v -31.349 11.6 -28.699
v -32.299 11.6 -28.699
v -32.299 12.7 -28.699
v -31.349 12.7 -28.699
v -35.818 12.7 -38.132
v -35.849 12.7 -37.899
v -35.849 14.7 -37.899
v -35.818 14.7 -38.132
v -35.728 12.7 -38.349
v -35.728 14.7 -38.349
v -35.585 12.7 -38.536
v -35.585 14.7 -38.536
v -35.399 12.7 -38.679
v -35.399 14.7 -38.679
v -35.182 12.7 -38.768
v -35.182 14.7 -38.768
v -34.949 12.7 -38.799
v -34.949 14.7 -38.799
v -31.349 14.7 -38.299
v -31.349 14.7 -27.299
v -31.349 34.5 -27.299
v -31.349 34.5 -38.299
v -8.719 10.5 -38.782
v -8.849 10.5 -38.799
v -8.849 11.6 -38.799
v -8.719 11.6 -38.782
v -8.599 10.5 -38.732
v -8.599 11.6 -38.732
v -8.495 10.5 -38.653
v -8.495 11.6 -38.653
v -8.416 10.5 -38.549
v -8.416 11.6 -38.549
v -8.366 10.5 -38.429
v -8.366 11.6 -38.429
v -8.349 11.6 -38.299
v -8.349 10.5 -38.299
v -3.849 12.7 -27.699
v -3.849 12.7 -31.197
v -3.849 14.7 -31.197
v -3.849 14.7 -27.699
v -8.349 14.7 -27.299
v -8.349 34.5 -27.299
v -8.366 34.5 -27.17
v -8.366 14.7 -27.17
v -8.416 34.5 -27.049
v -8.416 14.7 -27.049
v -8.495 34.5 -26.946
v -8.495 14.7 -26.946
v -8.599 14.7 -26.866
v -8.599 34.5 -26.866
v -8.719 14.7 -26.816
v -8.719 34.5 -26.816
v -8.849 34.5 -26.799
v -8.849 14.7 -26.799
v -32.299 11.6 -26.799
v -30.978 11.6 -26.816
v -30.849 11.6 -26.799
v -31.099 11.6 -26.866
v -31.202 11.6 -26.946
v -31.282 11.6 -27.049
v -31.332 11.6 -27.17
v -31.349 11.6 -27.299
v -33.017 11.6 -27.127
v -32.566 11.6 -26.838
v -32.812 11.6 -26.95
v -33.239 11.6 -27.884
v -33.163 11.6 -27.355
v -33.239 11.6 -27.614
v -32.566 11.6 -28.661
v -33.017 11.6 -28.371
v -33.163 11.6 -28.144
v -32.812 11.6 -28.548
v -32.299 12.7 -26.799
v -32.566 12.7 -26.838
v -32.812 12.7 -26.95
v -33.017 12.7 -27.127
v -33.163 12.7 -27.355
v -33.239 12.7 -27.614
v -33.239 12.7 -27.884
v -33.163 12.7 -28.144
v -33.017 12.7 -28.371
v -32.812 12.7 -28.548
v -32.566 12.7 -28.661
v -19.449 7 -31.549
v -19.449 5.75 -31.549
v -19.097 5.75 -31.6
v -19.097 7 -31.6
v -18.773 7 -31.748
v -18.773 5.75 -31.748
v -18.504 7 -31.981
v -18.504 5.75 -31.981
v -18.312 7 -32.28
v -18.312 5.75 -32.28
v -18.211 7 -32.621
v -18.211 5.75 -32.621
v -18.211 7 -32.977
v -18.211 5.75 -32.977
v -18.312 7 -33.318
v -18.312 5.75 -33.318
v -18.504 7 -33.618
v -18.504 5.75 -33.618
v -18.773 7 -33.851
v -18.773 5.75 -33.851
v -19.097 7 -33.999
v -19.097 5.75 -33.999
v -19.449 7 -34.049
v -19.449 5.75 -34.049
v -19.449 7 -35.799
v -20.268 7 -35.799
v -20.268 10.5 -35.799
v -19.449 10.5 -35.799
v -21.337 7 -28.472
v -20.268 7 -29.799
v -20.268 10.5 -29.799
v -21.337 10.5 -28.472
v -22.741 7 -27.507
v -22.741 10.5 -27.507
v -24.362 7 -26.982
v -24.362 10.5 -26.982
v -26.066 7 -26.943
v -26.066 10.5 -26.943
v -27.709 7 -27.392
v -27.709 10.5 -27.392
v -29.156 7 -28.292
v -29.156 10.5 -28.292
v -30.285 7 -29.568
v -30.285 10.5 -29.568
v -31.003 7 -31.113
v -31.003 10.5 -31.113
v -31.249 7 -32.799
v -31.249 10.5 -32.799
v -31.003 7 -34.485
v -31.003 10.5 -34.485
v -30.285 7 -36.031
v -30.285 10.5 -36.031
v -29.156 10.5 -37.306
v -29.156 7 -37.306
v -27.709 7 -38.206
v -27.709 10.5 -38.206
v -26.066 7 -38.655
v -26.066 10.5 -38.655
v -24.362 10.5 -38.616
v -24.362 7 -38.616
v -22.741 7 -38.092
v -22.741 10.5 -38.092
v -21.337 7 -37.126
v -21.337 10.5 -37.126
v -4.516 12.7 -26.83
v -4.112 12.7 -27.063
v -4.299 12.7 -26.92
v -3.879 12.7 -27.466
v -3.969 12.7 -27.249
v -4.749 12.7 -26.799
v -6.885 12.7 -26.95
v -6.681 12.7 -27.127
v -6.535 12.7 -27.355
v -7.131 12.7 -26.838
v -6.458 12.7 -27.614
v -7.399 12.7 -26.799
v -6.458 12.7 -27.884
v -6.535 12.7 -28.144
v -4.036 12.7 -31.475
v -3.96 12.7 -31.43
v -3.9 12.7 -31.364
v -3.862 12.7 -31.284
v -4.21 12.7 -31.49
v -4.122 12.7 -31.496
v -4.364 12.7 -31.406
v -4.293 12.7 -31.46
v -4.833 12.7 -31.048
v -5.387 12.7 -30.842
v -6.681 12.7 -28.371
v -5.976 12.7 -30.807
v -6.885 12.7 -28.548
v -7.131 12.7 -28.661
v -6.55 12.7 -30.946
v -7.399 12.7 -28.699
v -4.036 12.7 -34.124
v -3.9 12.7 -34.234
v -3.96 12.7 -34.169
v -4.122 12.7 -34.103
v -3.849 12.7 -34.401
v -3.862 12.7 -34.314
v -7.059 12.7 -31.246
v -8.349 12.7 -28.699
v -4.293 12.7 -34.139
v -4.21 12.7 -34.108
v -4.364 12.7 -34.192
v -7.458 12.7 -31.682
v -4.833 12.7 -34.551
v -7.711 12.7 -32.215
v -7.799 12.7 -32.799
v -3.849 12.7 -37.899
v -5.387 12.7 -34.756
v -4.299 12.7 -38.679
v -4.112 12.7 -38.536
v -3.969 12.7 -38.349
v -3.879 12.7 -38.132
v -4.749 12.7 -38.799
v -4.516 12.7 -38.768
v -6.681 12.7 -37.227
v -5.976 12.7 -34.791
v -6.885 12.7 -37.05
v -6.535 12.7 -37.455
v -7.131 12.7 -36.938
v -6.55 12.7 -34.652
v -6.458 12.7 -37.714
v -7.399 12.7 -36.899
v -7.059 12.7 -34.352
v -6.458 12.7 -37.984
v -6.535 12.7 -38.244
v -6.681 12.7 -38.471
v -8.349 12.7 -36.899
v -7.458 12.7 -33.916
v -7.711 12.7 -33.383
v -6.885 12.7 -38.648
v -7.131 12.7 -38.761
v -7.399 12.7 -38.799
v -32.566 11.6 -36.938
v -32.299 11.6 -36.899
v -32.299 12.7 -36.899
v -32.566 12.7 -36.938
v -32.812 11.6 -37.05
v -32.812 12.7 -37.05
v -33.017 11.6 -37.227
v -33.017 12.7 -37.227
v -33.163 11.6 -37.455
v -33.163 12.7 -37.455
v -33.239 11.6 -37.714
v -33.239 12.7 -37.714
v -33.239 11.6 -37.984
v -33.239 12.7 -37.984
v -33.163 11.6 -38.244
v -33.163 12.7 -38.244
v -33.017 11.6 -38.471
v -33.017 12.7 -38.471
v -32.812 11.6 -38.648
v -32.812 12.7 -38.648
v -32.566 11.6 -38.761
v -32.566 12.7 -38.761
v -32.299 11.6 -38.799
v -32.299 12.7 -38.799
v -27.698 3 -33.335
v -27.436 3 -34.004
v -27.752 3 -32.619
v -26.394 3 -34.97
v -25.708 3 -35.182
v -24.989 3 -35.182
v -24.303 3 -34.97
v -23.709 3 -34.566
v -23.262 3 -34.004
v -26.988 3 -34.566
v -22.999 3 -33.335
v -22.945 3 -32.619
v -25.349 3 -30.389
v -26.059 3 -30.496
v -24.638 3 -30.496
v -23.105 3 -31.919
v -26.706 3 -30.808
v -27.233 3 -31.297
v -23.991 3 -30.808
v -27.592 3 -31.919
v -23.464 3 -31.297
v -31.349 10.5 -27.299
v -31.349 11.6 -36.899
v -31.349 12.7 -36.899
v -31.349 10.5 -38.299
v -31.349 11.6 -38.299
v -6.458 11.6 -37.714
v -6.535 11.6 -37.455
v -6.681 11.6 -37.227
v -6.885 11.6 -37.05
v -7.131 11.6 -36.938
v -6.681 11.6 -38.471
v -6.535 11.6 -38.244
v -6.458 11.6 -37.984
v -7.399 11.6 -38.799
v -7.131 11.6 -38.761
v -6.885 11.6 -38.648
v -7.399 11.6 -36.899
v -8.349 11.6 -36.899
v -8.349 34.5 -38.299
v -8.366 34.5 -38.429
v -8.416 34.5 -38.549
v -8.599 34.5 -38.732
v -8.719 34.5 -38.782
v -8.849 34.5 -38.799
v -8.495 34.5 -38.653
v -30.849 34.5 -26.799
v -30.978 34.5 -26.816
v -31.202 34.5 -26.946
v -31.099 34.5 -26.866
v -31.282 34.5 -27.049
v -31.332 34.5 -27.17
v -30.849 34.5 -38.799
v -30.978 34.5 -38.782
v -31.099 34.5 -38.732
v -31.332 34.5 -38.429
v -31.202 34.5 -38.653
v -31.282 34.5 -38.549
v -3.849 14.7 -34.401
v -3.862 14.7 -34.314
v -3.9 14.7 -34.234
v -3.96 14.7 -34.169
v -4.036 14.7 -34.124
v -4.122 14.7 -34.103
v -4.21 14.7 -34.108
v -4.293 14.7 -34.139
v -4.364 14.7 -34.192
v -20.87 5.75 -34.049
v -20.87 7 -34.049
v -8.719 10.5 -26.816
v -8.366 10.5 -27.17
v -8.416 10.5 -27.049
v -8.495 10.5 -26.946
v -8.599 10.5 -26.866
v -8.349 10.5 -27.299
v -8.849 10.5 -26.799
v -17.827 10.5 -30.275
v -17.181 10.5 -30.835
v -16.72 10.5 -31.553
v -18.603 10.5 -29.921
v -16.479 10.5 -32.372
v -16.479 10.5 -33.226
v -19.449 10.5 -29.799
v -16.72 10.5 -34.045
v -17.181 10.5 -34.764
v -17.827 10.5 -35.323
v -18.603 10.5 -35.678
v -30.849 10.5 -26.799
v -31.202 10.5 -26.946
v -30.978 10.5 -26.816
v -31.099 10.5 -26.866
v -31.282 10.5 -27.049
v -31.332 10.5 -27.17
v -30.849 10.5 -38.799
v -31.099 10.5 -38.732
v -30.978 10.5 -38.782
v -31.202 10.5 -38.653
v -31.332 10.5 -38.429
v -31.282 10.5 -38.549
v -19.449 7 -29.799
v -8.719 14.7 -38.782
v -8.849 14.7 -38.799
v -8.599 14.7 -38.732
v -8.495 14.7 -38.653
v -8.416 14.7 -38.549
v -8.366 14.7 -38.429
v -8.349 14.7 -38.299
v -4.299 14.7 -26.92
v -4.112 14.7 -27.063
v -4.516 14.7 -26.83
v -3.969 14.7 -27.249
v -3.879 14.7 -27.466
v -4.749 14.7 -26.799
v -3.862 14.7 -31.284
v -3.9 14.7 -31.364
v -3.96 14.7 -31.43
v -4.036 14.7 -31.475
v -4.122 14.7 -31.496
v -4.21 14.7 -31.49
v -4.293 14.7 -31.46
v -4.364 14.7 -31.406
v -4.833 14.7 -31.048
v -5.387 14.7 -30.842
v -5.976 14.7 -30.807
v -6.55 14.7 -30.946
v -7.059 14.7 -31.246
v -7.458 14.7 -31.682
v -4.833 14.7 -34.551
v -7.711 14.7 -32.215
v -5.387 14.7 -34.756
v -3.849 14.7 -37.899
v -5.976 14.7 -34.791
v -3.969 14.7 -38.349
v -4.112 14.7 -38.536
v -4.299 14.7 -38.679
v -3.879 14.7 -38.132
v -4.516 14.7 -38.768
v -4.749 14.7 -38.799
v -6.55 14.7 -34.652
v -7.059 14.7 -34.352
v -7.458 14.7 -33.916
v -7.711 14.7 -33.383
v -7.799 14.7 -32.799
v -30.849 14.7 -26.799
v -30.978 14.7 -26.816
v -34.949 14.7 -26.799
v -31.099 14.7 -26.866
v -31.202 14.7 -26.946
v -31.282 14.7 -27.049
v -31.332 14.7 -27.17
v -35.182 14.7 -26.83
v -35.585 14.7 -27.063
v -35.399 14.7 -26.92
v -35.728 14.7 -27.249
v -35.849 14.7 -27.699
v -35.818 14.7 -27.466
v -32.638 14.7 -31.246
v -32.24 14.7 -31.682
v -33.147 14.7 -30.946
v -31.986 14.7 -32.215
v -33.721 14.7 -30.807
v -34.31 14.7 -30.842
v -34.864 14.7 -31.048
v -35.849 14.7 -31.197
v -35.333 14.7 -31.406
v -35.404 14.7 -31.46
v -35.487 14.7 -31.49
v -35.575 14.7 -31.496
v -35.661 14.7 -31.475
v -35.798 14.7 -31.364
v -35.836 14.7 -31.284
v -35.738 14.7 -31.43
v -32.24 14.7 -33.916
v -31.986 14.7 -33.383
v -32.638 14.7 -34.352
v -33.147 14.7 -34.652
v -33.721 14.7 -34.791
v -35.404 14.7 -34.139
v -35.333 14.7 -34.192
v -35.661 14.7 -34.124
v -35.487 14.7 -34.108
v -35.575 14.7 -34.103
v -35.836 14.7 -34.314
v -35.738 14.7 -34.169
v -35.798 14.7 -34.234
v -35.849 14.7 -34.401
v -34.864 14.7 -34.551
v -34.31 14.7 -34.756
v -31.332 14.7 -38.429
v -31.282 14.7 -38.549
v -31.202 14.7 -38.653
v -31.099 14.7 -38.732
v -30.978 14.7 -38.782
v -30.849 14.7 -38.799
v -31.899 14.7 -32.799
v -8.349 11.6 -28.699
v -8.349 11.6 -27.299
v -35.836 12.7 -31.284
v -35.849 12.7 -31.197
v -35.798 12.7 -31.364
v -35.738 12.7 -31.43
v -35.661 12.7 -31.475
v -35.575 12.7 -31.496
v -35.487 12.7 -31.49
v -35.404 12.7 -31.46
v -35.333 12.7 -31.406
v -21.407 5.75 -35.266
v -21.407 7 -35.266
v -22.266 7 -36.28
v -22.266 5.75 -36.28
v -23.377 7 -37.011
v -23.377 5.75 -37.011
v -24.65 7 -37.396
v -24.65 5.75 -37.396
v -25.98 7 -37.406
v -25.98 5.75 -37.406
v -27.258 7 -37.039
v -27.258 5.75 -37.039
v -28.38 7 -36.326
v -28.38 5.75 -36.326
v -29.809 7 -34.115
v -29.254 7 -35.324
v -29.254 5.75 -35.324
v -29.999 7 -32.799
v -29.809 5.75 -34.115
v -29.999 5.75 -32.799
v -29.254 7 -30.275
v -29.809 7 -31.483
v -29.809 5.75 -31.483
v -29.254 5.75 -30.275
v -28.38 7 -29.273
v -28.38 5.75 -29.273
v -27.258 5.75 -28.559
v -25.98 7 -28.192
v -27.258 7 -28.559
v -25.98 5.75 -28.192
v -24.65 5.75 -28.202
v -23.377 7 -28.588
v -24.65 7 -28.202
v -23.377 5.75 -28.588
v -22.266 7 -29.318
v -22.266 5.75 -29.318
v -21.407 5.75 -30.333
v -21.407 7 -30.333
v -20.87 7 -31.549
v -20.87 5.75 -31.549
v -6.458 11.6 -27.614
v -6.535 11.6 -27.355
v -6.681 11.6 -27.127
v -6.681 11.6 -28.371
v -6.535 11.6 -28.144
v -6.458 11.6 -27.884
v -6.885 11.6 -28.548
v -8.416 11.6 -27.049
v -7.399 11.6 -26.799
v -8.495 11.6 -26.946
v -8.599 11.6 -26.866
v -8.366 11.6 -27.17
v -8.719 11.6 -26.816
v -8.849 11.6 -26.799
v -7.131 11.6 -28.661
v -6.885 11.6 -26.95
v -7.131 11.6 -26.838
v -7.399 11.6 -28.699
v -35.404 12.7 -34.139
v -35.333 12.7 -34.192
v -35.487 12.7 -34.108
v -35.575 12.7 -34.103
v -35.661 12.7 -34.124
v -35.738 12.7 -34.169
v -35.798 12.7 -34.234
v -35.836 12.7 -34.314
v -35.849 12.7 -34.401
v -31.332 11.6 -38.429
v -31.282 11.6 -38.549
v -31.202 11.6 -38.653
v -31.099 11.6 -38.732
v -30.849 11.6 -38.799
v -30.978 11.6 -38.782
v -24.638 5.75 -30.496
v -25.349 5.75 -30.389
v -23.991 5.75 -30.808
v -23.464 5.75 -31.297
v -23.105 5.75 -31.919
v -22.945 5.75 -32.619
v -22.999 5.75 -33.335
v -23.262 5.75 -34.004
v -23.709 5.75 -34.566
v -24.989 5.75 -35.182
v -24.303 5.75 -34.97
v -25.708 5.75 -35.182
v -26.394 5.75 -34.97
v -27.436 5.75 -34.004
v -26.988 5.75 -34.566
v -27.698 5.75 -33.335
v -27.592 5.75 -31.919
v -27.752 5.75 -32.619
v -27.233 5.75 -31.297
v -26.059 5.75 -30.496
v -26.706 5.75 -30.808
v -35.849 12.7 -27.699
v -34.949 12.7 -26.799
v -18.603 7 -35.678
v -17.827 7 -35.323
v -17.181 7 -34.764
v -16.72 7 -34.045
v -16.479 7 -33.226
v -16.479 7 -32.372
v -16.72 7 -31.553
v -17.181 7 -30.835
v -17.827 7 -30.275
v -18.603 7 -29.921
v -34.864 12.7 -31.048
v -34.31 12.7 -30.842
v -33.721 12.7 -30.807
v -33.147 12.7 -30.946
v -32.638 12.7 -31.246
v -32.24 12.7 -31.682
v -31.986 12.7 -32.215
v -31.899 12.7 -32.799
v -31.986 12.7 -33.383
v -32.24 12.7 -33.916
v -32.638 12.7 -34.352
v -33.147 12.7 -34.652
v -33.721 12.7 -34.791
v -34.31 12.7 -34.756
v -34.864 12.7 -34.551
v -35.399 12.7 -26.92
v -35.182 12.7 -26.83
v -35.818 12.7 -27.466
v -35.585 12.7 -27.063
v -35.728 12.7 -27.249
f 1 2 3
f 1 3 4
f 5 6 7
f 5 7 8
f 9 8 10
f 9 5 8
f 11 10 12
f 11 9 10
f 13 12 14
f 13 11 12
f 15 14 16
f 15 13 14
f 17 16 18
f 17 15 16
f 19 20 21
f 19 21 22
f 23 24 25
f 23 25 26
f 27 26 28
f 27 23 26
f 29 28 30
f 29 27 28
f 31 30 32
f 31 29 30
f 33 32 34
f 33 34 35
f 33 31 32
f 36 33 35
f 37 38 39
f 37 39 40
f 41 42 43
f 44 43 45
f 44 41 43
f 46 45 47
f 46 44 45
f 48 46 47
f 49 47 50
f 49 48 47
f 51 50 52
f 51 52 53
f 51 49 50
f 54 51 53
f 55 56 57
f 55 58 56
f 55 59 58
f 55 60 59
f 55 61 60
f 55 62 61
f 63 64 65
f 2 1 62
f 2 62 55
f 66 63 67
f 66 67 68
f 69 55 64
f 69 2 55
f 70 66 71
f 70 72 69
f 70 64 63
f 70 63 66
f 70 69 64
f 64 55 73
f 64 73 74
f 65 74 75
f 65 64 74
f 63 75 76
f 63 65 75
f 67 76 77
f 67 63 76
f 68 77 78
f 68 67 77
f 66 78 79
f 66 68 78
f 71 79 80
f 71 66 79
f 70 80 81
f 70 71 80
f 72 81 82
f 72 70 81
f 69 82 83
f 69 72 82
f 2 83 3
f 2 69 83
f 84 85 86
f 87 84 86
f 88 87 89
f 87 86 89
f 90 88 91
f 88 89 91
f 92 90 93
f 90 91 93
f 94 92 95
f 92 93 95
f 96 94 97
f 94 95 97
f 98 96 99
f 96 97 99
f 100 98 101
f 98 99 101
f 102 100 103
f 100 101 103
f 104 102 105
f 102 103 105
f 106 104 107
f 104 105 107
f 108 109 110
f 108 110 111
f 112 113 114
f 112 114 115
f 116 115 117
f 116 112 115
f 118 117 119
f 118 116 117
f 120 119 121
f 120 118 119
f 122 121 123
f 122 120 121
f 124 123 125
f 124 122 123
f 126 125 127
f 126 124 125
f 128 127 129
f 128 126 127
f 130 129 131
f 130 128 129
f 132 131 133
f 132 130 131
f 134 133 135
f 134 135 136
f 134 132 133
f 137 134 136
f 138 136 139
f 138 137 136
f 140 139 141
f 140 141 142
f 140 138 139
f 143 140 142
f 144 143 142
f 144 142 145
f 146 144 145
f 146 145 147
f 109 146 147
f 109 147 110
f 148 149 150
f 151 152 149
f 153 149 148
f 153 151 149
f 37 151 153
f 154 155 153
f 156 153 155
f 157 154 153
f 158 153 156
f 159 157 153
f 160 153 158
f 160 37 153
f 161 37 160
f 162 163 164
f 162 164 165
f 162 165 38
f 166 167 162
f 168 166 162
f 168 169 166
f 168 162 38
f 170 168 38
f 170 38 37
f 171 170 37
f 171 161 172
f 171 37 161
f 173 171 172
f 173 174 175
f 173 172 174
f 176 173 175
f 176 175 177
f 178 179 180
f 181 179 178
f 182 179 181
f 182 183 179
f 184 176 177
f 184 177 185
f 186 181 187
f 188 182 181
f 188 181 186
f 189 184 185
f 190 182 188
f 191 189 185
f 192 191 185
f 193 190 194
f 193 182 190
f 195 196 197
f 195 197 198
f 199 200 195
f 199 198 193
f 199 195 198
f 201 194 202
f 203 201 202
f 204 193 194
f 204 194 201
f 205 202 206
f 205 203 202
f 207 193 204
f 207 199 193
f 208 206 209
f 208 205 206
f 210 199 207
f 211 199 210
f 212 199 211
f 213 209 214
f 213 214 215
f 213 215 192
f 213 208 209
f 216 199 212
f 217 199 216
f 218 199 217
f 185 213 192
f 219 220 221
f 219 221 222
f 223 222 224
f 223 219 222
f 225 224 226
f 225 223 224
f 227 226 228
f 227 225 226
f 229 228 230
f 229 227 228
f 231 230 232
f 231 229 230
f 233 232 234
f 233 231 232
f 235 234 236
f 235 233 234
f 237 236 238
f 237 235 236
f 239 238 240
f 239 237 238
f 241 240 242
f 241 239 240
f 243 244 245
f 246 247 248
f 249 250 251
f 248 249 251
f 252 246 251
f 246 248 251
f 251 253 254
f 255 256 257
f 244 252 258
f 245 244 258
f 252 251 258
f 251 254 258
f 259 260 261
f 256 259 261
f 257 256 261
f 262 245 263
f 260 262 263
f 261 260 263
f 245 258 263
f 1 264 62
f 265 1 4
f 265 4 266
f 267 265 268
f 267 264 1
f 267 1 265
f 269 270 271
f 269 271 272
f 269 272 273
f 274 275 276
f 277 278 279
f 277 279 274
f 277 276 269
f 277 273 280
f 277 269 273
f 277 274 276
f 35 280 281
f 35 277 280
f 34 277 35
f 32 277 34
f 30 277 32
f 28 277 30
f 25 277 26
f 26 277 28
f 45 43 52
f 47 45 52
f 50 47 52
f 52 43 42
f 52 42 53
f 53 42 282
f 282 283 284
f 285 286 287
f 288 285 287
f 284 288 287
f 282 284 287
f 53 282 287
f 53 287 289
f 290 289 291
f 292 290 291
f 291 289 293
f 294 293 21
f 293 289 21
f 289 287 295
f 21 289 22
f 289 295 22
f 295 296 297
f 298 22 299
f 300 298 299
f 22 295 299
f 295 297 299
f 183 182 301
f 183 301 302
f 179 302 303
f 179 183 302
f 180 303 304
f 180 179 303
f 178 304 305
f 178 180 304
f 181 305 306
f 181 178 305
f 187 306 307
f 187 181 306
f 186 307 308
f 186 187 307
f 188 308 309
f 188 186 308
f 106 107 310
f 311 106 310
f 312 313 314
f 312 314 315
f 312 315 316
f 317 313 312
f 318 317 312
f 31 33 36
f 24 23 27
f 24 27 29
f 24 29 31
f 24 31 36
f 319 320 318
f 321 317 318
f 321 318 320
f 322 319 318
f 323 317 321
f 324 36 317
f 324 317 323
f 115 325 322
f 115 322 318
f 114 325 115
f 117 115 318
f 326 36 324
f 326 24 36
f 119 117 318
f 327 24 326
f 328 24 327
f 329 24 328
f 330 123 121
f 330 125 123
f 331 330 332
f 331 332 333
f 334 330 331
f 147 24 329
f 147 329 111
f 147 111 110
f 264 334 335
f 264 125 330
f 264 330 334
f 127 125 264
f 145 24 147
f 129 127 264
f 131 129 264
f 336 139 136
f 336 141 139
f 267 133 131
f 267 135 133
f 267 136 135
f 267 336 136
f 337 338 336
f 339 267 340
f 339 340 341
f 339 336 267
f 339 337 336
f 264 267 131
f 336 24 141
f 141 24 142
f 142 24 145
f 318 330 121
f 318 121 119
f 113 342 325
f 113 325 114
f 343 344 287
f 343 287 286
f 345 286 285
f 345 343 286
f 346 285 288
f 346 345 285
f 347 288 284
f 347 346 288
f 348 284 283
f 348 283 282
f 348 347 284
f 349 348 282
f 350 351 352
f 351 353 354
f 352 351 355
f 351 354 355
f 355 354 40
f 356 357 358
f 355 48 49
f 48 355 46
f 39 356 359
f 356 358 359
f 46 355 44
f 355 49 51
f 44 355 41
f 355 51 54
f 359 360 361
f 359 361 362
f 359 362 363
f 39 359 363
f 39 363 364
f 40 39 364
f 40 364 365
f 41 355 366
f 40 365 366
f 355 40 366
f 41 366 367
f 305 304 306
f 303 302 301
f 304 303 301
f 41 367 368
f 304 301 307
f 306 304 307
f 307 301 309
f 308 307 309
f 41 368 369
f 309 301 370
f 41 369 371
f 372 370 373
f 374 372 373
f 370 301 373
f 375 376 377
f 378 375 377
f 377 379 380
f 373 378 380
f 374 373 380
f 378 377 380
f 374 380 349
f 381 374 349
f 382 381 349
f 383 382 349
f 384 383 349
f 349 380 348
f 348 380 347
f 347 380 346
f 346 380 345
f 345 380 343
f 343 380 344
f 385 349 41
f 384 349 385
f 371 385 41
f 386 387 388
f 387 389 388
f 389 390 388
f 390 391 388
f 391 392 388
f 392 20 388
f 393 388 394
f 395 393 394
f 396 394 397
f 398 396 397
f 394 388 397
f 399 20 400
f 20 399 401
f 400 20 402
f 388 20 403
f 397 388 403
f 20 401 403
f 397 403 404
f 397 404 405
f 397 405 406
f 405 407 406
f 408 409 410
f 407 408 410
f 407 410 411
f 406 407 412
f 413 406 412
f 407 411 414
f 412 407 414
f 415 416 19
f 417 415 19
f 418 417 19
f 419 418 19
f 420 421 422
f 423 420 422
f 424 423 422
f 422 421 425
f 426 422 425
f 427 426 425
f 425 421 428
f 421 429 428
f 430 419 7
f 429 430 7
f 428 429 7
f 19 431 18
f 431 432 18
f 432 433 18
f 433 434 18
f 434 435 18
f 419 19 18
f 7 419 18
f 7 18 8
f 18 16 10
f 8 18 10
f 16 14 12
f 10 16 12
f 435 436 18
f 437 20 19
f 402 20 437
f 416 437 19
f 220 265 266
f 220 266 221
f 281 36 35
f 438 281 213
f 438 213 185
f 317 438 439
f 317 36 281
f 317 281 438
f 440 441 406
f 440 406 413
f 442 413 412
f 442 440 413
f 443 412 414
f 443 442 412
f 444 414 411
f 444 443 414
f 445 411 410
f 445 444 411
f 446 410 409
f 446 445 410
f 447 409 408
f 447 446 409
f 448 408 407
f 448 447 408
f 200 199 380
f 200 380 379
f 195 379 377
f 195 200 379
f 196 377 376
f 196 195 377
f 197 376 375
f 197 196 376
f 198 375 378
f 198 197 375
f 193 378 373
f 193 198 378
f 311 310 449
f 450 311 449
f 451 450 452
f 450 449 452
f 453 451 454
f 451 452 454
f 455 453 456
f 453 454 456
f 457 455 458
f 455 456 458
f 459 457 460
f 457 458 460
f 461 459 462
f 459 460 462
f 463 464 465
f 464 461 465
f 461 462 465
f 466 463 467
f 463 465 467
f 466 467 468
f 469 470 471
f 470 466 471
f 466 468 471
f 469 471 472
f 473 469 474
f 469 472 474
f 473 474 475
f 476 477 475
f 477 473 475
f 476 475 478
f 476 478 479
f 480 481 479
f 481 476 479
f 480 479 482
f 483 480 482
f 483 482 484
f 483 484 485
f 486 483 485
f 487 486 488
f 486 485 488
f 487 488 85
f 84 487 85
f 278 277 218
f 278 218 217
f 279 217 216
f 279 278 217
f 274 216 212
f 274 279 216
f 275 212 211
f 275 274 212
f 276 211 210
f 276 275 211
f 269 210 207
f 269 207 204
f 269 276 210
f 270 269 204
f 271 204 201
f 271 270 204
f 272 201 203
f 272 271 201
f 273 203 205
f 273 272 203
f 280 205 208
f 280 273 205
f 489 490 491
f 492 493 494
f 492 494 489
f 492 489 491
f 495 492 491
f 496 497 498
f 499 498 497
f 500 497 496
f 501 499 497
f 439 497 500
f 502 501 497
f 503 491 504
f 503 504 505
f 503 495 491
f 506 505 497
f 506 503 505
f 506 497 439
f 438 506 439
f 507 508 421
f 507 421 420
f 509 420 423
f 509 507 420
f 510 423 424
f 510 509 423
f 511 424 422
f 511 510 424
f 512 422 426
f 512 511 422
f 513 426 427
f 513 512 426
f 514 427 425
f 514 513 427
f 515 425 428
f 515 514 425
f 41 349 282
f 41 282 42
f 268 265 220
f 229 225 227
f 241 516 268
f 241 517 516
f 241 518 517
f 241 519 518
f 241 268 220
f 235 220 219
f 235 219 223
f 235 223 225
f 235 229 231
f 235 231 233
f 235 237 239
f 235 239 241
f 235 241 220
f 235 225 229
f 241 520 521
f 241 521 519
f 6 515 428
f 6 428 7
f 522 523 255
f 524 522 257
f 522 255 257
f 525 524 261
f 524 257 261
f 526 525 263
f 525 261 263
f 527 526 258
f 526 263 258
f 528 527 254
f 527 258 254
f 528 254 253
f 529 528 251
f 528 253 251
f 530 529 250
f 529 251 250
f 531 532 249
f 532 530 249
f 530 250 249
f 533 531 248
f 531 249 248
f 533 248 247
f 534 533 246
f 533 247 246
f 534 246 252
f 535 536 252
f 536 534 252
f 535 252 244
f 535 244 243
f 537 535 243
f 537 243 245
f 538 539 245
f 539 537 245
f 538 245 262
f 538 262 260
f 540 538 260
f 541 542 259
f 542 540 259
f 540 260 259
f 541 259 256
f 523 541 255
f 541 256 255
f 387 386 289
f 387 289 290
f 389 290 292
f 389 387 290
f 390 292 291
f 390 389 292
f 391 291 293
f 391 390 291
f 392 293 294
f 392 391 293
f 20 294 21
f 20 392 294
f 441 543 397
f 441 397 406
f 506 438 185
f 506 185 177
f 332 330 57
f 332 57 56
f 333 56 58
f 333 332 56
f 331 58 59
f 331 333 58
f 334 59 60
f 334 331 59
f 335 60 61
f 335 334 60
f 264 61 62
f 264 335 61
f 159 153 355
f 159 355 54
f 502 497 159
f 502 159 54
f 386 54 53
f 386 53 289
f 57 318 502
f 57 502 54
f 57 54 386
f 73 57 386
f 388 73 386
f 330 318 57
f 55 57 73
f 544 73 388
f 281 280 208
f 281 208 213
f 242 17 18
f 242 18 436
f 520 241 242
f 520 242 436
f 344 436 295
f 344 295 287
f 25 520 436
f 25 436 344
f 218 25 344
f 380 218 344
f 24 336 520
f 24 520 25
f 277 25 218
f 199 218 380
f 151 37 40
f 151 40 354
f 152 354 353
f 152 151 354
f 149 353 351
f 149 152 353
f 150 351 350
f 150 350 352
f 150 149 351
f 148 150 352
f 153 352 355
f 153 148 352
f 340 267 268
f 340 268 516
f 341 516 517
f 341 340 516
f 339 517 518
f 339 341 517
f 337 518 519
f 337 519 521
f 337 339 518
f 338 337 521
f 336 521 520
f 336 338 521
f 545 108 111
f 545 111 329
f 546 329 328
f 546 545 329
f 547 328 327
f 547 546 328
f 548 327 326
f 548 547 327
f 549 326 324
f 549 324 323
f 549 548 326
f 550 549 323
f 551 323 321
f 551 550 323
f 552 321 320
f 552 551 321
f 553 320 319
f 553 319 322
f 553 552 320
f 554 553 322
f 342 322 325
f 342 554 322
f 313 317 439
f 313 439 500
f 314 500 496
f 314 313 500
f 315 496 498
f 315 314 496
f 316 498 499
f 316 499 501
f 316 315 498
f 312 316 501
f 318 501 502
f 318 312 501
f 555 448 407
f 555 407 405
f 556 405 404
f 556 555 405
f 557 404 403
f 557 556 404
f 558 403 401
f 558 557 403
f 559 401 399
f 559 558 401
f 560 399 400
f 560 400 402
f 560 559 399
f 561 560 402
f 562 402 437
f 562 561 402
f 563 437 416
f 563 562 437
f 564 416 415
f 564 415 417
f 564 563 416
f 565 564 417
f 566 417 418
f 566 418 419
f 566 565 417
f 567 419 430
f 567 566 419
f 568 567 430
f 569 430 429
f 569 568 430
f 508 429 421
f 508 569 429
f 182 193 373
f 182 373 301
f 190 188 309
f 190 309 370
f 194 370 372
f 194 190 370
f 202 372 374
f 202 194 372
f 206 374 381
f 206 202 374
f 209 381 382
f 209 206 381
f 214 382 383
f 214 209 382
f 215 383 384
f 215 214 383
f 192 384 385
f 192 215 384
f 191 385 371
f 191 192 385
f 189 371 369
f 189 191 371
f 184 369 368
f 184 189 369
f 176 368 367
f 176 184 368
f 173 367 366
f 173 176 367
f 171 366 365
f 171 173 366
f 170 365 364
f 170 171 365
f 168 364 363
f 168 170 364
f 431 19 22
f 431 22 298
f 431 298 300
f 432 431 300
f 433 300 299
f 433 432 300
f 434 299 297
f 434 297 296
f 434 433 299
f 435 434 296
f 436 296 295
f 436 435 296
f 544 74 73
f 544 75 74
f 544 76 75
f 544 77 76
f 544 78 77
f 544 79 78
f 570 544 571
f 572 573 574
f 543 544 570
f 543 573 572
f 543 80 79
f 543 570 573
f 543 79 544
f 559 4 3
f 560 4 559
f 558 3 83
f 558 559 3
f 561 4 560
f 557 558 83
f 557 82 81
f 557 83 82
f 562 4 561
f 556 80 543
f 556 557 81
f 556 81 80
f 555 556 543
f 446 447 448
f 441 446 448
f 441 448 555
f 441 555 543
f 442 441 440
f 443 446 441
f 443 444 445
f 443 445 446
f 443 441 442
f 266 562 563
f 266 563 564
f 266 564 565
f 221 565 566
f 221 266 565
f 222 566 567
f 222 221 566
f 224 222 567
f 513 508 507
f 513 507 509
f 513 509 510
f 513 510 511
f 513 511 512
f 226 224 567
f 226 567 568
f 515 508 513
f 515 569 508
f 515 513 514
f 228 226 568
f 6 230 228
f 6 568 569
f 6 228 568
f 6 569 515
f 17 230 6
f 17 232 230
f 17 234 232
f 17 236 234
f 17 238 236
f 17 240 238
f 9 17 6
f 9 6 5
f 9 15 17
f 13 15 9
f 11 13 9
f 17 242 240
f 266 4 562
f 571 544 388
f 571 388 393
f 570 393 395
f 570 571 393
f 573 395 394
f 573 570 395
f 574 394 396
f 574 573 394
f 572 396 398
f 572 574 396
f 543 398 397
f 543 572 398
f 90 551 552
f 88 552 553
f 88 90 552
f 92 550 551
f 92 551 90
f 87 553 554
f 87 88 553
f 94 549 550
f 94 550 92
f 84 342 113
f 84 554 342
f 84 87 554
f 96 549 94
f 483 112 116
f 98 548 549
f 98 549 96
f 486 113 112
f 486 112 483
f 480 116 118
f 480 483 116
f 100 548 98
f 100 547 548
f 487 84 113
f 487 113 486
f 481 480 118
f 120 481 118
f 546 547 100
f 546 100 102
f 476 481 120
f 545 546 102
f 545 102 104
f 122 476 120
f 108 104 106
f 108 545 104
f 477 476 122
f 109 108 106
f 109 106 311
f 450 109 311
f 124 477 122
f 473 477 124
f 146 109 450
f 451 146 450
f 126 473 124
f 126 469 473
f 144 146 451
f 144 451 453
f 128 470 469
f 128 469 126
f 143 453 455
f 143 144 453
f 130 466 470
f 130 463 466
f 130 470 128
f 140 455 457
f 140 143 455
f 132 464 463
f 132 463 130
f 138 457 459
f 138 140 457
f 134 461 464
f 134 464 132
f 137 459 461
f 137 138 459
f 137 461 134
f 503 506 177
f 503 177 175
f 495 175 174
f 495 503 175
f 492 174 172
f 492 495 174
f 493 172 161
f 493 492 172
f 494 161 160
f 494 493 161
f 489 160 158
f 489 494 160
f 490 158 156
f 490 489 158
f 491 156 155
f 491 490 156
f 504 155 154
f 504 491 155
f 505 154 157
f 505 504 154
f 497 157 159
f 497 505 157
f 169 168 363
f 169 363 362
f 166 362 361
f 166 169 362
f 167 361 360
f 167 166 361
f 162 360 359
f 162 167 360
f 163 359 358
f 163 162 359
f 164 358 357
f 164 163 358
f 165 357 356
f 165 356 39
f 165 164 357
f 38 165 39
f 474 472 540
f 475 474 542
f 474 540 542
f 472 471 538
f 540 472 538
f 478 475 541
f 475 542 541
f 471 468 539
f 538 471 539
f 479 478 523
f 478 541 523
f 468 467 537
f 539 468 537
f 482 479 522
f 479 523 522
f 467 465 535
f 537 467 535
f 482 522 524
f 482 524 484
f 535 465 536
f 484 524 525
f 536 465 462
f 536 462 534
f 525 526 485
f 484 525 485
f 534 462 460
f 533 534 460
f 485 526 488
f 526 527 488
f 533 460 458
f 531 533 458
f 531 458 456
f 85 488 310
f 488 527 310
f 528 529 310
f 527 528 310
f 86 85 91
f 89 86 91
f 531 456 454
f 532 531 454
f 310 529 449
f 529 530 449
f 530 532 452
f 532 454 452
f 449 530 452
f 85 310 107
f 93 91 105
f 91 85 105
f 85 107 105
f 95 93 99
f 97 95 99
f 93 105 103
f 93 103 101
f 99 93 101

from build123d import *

# Parameters (mm, degrees)
BOSS_EXTRUDE3_DEPTH = 1.1
BOSS_EXTRUDE4_DEPTH = 24
BOSS_EXTRUDE5_DEPTH = 5.7
BOSS_EXTRUDE6_DEPTH = 6.95
SKETCH8_R           = 2.41
BOSS_EXTRUDE7_DEPTH = 9.7
BOSS_EXTRUDE8_DEPTH = 2


# Read off the part's stored shape, not the designer's step: Imported1
with BuildPart() as part:
    # Sketch4 → Boss-Extrude3 (new body)
    with BuildSketch(Plane(origin=(0, 11.6, 0), x_dir=(1, 0, 0), z_dir=(0, 1, 0))):
        with BuildLine():
            Line((-32.298673735, 38.799155683), (-7.398673735, 38.799155683))
            ThreePointArc((-7.398673735, 38.799155683), (-6.448673735, 37.849155683), (-7.398673735, 36.899155683))
            Line((-7.398673735, 36.899155683), (-8.348673735, 36.899155683))
            Line((-8.348673735, 36.899155683), (-8.348673735, 28.699155683))
            Line((-8.348673735, 28.699155683), (-7.398673735, 28.699155683))
            ThreePointArc((-7.398673735, 28.699155683), (-6.448673735, 27.749155683), (-7.398673735, 26.799155683))
            Line((-7.398673735, 26.799155683), (-32.298673735, 26.799155683))
            ThreePointArc((-32.298673735, 26.799155683), (-33.248673735, 27.749155683), (-32.298673735, 28.699155683))
            Line((-32.298673735, 28.699155683), (-31.348673735, 28.699155683))
            Line((-31.348673735, 28.699155683), (-31.348673735, 36.899155683))
            Line((-31.348673735, 36.899155683), (-32.298673735, 36.899155683))
            ThreePointArc((-32.298673735, 36.899155683), (-33.248673735, 37.849155683), (-32.298673735, 38.799155683))
        make_face()
    extrude(amount=BOSS_EXTRUDE3_DEPTH)

    # Sketch5 → Boss-Extrude4 (add)
    with BuildSketch(Plane(origin=(0, 10.5, 0), x_dir=(1, 0, 0), z_dir=(0, 1, 0))):
        with BuildLine():
            Line((-31.348673735, 27.299155683), (-31.348673735, 38.299155683))
            ThreePointArc((-31.348673735, 38.299155683), (-31.202227125, 38.652709074), (-30.848673735, 38.799155683))
            Line((-30.848673735, 38.799155683), (-8.848673735, 38.799155683))
            ThreePointArc((-8.848673735, 38.799155683), (-8.495120344, 38.652709074), (-8.348673735, 38.299155683))
            Line((-8.348673735, 38.299155683), (-8.348673735, 27.299155683))
            ThreePointArc((-8.348673735, 27.299155683), (-8.495120344, 26.945602293), (-8.848673735, 26.799155683))
            Line((-8.848673735, 26.799155683), (-30.848673735, 26.799155683))
            ThreePointArc((-30.848673735, 26.799155683), (-31.202227125, 26.945602293), (-31.348673735, 27.299155683))
        make_face()
    extrude(amount=BOSS_EXTRUDE4_DEPTH)

    # Sketch6 → Boss-Extrude5 (add)
    with BuildSketch(Plane(origin=(0, 7, 0), x_dir=(1, 0, 0), z_dir=(0, 1, 0))):
        with BuildLine():
            Line((-19.448673735, 29.799155683), (-20.268319416, 29.799155683))
            ThreePointArc((-20.268319416, 29.799155683), (-31.248673735, 32.799155683), (-20.268319416, 35.799155683))
            Line((-20.268319416, 35.799155683), (-19.448673735, 35.799155683))
            ThreePointArc((-19.448673735, 35.799155683), (-16.448673735, 32.799155683), (-19.448673735, 29.799155683))
        make_face()
    extrude(amount=BOSS_EXTRUDE5_DEPTH)

    # Sketch7 → Boss-Extrude6 (add)
    with BuildSketch(Plane(origin=(0, 5.75, 0), x_dir=(1, 0, 0), z_dir=(0, 1, 0))):
        with BuildLine():
            Line((-19.448673735, 34.049155683), (-20.869834599, 34.049155683))
            ThreePointArc((-20.869834599, 34.049155683), (-29.998673735, 32.799155683), (-20.869834599, 31.549155683))
            Line((-20.869834599, 31.549155683), (-19.448673735, 31.549155683))
            ThreePointArc((-19.448673735, 31.549155683), (-18.198673735, 32.799155683), (-19.448673735, 34.049155683))
        make_face()
    extrude(amount=BOSS_EXTRUDE6_DEPTH)

    # Sketch8 → Boss-Extrude7 (add)
    with BuildSketch(Plane(origin=(0, 3, 0), x_dir=(1, 0, 0), z_dir=(0, 1, 0))):
        with Locations(Location((-25.348673735, 32.799155683, 0), (0, 0, 270))):
            Circle(SKETCH8_R)
    extrude(amount=BOSS_EXTRUDE7_DEPTH)

    # Sketch1 → Boss-Extrude8 (add)
    with BuildSketch(Plane(origin=(0, 12.7, 0), x_dir=(1, 0, 0), z_dir=(0, 1, 0))):
        with BuildLine():
            Line((-34.948673735, 38.799155683), (-4.748673735, 38.799155683))
            ThreePointArc((-4.748673735, 38.799155683), (-4.112277632, 38.535551786), (-3.848673735, 37.899155683))
            Line((-3.848673735, 37.899155683), (-3.848673735, 34.401497719))
            ThreePointArc((-3.848673735, 34.401497719), (-4.035902323, 34.123500221), (-4.363891126, 34.192496584))
            ThreePointArc((-4.363891126, 34.192496584), (-7.798673735, 32.799155683), (-4.363891126, 31.405814782))
            ThreePointArc((-4.363891126, 31.405814782), (-4.035902323, 31.474811145), (-3.848673735, 31.196813647))
            Line((-3.848673735, 31.196813647), (-3.848673735, 27.699155683))
            ThreePointArc((-3.848673735, 27.699155683), (-4.112277632, 27.06275958), (-4.748673735, 26.799155683))
            Line((-4.748673735, 26.799155683), (-34.948673735, 26.799155683))
            ThreePointArc((-34.948673735, 26.799155683), (-35.585069838, 27.06275958), (-35.848673735, 27.699155683))
            Line((-35.848673735, 27.699155683), (-35.848673735, 31.196813647))
            ThreePointArc((-35.848673735, 31.196813647), (-35.661445146, 31.474811145), (-35.333456343, 31.405814782))
            ThreePointArc((-35.333456343, 31.405814782), (-31.898673735, 32.799155683), (-35.333456343, 34.192496584))
            ThreePointArc((-35.333456343, 34.192496584), (-35.661445146, 34.123500221), (-35.848673735, 34.401497719))
            Line((-35.848673735, 34.401497719), (-35.848673735, 37.899155683))
            ThreePointArc((-35.848673735, 37.899155683), (-35.585069838, 38.535551786), (-34.948673735, 38.799155683))
        make_face()
    extrude(amount=BOSS_EXTRUDE8_DEPTH)


solid = part.part
